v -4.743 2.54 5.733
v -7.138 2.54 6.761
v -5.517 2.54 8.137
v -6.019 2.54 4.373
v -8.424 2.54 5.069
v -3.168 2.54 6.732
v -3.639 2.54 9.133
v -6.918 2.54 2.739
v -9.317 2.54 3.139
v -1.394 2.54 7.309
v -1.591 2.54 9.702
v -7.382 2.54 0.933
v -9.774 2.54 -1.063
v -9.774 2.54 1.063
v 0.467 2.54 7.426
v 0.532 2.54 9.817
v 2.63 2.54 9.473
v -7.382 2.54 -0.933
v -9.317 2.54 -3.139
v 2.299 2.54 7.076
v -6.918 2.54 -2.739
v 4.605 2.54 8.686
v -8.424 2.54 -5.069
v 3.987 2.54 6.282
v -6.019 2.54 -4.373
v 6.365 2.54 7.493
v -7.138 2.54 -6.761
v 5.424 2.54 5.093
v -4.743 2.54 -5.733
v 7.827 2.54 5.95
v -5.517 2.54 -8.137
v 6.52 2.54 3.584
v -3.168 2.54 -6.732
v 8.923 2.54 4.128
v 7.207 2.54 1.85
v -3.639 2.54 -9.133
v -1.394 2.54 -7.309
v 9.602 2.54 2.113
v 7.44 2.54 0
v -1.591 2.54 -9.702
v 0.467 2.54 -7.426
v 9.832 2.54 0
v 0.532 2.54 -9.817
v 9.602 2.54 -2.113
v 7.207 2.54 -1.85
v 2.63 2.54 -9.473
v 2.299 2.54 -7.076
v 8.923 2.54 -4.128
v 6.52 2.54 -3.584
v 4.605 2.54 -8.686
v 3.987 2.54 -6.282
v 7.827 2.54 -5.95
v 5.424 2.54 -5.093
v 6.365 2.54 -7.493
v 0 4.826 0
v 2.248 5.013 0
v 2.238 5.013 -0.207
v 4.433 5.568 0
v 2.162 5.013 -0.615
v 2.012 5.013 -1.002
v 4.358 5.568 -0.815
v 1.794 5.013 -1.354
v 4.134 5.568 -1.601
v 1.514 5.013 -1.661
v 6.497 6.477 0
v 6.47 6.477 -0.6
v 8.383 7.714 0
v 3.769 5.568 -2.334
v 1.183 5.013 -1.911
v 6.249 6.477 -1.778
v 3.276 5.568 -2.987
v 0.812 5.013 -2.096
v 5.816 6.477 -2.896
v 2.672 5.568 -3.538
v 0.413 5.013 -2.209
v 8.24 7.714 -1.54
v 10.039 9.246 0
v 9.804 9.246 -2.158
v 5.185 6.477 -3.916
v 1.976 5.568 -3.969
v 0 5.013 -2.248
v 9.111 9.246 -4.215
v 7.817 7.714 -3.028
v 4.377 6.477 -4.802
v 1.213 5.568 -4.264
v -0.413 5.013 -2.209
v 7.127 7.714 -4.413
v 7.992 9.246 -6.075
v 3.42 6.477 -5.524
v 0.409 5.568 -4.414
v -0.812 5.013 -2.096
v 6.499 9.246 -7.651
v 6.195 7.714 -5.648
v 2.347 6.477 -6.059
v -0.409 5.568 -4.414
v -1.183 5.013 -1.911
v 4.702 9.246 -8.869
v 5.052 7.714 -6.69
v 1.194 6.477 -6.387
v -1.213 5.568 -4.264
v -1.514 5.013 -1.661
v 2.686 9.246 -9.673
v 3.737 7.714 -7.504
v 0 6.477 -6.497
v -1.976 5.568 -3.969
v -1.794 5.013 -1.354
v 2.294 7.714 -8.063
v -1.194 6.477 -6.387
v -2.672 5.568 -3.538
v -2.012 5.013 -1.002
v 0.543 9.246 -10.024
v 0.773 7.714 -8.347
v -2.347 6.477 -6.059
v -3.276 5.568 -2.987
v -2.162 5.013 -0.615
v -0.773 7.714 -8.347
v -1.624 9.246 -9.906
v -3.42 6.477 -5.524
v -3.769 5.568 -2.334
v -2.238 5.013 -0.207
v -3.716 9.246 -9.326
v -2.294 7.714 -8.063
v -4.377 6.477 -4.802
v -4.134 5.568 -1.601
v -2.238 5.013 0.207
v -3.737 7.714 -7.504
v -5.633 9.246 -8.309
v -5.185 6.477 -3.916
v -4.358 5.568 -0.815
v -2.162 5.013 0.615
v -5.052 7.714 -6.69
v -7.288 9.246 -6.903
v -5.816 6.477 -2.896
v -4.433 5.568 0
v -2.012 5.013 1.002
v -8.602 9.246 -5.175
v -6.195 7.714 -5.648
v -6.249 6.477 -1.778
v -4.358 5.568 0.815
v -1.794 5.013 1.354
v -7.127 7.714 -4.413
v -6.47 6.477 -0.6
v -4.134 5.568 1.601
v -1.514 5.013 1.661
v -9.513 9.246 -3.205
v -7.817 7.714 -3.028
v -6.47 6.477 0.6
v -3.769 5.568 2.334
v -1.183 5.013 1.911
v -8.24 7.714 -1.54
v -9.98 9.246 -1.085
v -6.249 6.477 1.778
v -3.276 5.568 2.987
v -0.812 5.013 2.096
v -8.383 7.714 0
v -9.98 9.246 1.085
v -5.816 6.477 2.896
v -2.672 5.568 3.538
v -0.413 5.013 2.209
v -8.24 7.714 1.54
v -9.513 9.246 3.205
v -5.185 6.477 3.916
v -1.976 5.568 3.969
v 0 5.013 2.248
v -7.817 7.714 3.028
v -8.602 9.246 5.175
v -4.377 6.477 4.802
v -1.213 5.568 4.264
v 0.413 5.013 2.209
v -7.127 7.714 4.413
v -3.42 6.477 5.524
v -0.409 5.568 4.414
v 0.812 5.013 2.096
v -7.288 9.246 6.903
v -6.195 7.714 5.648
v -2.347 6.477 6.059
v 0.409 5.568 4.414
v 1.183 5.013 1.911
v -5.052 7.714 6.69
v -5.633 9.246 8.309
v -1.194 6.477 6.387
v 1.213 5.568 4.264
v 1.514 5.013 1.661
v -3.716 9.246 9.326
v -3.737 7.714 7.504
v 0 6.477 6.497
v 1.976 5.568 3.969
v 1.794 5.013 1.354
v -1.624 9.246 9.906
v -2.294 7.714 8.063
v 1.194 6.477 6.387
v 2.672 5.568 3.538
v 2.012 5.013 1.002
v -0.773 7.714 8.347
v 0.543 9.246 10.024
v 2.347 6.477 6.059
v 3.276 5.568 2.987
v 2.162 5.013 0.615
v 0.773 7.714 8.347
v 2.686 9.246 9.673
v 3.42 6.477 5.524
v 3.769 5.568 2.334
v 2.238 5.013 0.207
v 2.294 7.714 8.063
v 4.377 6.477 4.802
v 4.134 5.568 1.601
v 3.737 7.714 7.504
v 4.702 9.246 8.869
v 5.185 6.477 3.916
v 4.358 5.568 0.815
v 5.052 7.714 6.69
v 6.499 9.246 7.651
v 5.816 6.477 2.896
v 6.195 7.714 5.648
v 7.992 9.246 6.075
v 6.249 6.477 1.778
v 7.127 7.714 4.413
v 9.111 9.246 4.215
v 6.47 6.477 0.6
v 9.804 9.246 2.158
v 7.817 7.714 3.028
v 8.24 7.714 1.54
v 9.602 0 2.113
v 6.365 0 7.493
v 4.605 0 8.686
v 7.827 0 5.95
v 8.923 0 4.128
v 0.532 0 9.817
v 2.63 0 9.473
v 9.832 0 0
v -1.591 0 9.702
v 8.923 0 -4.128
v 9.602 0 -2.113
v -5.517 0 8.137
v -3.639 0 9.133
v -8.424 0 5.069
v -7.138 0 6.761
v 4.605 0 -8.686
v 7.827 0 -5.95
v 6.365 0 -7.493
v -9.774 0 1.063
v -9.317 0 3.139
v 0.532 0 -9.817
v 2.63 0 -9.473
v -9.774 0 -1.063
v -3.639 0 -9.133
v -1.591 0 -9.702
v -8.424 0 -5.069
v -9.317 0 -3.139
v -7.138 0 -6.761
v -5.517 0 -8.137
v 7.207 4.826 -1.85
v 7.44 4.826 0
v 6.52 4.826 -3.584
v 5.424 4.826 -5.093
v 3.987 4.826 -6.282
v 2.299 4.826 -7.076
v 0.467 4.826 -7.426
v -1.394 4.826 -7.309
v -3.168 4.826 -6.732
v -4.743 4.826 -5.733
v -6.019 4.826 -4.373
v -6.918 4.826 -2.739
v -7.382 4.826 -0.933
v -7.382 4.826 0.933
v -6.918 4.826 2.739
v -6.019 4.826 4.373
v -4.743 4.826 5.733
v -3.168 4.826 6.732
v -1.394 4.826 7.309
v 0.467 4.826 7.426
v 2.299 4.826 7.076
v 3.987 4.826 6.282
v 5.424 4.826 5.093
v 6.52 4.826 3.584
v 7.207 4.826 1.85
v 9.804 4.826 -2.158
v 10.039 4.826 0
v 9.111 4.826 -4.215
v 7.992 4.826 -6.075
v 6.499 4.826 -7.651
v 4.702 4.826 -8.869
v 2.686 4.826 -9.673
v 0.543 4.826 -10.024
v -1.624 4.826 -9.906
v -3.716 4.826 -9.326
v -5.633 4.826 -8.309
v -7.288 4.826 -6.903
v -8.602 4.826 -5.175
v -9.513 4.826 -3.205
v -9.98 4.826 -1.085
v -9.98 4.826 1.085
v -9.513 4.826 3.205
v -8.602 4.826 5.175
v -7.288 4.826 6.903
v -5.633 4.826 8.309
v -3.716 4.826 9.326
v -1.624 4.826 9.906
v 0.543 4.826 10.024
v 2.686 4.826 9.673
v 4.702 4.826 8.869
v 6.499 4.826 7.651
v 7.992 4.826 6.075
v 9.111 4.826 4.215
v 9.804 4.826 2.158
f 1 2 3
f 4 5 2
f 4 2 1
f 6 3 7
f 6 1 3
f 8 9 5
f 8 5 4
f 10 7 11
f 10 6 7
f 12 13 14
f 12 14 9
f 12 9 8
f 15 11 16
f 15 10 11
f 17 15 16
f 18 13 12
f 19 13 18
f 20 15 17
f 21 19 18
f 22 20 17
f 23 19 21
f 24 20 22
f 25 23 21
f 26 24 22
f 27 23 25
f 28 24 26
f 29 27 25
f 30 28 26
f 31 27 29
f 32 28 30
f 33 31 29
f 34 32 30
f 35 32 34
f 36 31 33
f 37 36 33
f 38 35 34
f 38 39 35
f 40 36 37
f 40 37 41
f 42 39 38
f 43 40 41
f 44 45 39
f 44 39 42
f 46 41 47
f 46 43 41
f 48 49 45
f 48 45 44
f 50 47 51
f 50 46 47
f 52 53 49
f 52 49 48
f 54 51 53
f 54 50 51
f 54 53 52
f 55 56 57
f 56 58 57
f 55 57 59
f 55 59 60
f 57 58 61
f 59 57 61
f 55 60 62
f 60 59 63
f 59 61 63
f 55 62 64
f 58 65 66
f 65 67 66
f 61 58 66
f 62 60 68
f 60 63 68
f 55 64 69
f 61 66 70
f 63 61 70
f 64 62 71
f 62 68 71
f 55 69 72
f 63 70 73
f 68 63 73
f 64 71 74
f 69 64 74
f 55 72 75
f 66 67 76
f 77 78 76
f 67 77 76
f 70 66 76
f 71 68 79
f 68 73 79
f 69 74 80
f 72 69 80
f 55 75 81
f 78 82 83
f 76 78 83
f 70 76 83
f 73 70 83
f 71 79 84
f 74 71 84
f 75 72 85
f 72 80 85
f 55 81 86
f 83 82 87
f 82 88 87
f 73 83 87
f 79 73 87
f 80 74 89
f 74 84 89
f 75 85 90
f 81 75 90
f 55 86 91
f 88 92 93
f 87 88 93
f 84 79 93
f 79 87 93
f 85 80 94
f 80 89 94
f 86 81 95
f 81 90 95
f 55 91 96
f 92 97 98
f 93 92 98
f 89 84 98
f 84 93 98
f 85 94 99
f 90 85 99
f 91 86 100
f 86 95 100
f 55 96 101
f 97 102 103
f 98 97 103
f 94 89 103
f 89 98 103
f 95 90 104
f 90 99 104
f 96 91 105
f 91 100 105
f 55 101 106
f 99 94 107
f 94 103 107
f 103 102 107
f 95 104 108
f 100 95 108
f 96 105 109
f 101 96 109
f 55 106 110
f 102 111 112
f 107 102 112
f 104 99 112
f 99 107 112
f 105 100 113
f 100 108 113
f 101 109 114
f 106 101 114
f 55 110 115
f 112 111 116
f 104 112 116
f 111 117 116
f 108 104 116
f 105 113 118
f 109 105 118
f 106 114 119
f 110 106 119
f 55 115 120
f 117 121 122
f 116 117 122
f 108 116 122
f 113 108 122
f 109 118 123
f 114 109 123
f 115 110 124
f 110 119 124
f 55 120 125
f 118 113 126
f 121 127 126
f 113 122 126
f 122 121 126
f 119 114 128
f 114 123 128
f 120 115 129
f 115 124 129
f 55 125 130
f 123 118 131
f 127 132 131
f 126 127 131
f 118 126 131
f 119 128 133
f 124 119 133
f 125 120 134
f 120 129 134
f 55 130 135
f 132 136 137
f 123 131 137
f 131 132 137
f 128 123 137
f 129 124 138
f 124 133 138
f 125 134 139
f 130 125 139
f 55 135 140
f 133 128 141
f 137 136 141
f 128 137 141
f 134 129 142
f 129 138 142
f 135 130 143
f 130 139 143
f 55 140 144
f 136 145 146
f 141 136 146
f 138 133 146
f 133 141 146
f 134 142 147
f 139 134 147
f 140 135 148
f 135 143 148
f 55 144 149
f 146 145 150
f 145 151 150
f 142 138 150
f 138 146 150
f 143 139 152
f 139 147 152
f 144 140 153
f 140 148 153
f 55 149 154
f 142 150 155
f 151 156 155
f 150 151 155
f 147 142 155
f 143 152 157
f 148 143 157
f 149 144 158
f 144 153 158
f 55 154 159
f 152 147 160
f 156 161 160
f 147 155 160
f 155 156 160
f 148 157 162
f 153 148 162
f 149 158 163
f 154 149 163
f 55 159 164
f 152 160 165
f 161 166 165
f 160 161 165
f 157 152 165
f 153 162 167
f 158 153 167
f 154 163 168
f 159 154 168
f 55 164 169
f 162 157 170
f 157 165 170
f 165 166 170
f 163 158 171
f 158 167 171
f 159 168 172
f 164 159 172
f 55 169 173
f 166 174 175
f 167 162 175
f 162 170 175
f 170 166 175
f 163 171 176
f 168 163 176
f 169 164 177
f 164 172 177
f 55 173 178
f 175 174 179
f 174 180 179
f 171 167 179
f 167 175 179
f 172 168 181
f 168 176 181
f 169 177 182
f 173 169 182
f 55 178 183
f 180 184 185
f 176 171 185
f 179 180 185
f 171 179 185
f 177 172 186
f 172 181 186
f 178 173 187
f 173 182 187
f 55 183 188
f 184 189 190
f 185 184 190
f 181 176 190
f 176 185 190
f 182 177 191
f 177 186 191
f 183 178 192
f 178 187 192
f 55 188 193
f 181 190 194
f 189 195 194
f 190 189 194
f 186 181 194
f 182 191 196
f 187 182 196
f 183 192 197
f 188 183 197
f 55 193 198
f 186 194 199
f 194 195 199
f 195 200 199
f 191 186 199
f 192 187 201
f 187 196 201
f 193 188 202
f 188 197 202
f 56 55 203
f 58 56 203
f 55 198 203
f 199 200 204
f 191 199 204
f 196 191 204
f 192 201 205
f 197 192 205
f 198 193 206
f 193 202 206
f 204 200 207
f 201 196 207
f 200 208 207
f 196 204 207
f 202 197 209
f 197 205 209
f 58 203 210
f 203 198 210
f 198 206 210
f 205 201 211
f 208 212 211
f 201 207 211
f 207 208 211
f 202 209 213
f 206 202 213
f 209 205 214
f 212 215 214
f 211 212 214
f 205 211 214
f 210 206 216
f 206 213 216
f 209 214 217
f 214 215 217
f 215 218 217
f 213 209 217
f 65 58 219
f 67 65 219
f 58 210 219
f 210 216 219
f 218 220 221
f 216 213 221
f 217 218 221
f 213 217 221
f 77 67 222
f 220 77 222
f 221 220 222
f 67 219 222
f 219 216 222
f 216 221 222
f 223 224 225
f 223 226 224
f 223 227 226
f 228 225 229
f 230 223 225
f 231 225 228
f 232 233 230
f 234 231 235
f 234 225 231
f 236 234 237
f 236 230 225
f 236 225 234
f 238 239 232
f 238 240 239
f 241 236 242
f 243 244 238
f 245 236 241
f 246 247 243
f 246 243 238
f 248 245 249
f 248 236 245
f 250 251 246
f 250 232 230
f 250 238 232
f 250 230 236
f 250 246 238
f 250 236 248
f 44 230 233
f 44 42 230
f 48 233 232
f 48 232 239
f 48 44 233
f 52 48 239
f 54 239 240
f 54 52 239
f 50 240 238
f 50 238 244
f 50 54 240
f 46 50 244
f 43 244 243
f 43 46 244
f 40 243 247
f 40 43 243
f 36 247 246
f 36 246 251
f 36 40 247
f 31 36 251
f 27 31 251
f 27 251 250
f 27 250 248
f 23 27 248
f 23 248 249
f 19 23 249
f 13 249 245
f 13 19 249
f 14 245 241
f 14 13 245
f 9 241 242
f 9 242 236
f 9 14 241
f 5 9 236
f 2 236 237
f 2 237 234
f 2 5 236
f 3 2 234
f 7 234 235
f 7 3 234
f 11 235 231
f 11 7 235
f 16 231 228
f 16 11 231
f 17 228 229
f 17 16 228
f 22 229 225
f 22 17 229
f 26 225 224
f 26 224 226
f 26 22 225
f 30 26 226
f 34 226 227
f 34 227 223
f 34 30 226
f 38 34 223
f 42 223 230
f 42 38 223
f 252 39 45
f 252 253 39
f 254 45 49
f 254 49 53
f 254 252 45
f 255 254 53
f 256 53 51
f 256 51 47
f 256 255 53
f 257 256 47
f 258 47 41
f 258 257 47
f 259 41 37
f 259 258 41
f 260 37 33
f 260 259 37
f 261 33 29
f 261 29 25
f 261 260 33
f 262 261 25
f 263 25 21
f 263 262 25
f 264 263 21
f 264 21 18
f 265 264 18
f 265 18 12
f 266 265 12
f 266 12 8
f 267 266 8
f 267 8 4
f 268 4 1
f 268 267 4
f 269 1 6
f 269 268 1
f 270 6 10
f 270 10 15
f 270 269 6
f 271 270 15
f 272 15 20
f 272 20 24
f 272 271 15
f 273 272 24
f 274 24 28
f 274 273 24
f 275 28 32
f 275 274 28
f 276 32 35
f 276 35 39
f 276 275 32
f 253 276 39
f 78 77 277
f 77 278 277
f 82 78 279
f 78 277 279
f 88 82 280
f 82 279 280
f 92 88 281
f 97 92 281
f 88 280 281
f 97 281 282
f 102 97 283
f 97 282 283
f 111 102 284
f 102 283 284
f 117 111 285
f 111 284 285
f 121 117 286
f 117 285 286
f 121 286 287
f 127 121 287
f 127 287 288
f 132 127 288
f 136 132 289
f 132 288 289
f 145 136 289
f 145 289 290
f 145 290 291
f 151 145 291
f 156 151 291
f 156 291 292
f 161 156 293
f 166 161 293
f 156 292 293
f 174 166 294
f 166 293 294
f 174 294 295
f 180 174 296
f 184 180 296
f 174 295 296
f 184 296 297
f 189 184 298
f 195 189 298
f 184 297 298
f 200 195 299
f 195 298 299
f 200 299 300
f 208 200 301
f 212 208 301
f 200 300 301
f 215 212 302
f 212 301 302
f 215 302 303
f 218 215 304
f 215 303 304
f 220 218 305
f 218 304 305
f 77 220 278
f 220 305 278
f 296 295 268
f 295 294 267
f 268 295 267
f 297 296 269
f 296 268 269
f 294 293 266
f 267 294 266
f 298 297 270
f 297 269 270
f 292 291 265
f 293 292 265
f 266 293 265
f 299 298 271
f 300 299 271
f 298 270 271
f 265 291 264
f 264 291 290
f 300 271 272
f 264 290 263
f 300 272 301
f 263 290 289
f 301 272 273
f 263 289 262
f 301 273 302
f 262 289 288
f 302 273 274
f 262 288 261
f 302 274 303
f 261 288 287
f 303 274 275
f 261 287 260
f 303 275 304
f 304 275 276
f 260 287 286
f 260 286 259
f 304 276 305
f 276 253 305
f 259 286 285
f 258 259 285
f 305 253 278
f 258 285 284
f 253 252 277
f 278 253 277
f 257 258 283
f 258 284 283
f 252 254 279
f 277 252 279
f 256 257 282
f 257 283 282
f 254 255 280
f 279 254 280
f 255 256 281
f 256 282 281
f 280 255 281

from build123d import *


with BuildPart() as part:
    # Sketch3 → Revolve3 (revolve)
    with BuildSketch(Plane.XY):
        with BuildLine():
            Line((0, 4.826), (0, 0))
            Line((0, 0), (9.831510881, 0))
            Line((9.831510881, 0), (9.831510881, 2.54))
            Line((9.831510881, 2.54), (7.440423316, 2.54))
            Line((7.440423316, 2.54), (7.440423316, 4.826))
            Line((7.440423316, 4.826), (10.038536816, 4.826))
            Line((10.038536816, 4.826), (10.038536816, 9.2456))
            ThreePointArc((10.038536816, 9.2456), (5.484183749, 5.979806298), (0, 4.826))
        make_face()
    revolve(axis=Axis((0, 0, 0), (0, 1, 0)))


solid = part.part
